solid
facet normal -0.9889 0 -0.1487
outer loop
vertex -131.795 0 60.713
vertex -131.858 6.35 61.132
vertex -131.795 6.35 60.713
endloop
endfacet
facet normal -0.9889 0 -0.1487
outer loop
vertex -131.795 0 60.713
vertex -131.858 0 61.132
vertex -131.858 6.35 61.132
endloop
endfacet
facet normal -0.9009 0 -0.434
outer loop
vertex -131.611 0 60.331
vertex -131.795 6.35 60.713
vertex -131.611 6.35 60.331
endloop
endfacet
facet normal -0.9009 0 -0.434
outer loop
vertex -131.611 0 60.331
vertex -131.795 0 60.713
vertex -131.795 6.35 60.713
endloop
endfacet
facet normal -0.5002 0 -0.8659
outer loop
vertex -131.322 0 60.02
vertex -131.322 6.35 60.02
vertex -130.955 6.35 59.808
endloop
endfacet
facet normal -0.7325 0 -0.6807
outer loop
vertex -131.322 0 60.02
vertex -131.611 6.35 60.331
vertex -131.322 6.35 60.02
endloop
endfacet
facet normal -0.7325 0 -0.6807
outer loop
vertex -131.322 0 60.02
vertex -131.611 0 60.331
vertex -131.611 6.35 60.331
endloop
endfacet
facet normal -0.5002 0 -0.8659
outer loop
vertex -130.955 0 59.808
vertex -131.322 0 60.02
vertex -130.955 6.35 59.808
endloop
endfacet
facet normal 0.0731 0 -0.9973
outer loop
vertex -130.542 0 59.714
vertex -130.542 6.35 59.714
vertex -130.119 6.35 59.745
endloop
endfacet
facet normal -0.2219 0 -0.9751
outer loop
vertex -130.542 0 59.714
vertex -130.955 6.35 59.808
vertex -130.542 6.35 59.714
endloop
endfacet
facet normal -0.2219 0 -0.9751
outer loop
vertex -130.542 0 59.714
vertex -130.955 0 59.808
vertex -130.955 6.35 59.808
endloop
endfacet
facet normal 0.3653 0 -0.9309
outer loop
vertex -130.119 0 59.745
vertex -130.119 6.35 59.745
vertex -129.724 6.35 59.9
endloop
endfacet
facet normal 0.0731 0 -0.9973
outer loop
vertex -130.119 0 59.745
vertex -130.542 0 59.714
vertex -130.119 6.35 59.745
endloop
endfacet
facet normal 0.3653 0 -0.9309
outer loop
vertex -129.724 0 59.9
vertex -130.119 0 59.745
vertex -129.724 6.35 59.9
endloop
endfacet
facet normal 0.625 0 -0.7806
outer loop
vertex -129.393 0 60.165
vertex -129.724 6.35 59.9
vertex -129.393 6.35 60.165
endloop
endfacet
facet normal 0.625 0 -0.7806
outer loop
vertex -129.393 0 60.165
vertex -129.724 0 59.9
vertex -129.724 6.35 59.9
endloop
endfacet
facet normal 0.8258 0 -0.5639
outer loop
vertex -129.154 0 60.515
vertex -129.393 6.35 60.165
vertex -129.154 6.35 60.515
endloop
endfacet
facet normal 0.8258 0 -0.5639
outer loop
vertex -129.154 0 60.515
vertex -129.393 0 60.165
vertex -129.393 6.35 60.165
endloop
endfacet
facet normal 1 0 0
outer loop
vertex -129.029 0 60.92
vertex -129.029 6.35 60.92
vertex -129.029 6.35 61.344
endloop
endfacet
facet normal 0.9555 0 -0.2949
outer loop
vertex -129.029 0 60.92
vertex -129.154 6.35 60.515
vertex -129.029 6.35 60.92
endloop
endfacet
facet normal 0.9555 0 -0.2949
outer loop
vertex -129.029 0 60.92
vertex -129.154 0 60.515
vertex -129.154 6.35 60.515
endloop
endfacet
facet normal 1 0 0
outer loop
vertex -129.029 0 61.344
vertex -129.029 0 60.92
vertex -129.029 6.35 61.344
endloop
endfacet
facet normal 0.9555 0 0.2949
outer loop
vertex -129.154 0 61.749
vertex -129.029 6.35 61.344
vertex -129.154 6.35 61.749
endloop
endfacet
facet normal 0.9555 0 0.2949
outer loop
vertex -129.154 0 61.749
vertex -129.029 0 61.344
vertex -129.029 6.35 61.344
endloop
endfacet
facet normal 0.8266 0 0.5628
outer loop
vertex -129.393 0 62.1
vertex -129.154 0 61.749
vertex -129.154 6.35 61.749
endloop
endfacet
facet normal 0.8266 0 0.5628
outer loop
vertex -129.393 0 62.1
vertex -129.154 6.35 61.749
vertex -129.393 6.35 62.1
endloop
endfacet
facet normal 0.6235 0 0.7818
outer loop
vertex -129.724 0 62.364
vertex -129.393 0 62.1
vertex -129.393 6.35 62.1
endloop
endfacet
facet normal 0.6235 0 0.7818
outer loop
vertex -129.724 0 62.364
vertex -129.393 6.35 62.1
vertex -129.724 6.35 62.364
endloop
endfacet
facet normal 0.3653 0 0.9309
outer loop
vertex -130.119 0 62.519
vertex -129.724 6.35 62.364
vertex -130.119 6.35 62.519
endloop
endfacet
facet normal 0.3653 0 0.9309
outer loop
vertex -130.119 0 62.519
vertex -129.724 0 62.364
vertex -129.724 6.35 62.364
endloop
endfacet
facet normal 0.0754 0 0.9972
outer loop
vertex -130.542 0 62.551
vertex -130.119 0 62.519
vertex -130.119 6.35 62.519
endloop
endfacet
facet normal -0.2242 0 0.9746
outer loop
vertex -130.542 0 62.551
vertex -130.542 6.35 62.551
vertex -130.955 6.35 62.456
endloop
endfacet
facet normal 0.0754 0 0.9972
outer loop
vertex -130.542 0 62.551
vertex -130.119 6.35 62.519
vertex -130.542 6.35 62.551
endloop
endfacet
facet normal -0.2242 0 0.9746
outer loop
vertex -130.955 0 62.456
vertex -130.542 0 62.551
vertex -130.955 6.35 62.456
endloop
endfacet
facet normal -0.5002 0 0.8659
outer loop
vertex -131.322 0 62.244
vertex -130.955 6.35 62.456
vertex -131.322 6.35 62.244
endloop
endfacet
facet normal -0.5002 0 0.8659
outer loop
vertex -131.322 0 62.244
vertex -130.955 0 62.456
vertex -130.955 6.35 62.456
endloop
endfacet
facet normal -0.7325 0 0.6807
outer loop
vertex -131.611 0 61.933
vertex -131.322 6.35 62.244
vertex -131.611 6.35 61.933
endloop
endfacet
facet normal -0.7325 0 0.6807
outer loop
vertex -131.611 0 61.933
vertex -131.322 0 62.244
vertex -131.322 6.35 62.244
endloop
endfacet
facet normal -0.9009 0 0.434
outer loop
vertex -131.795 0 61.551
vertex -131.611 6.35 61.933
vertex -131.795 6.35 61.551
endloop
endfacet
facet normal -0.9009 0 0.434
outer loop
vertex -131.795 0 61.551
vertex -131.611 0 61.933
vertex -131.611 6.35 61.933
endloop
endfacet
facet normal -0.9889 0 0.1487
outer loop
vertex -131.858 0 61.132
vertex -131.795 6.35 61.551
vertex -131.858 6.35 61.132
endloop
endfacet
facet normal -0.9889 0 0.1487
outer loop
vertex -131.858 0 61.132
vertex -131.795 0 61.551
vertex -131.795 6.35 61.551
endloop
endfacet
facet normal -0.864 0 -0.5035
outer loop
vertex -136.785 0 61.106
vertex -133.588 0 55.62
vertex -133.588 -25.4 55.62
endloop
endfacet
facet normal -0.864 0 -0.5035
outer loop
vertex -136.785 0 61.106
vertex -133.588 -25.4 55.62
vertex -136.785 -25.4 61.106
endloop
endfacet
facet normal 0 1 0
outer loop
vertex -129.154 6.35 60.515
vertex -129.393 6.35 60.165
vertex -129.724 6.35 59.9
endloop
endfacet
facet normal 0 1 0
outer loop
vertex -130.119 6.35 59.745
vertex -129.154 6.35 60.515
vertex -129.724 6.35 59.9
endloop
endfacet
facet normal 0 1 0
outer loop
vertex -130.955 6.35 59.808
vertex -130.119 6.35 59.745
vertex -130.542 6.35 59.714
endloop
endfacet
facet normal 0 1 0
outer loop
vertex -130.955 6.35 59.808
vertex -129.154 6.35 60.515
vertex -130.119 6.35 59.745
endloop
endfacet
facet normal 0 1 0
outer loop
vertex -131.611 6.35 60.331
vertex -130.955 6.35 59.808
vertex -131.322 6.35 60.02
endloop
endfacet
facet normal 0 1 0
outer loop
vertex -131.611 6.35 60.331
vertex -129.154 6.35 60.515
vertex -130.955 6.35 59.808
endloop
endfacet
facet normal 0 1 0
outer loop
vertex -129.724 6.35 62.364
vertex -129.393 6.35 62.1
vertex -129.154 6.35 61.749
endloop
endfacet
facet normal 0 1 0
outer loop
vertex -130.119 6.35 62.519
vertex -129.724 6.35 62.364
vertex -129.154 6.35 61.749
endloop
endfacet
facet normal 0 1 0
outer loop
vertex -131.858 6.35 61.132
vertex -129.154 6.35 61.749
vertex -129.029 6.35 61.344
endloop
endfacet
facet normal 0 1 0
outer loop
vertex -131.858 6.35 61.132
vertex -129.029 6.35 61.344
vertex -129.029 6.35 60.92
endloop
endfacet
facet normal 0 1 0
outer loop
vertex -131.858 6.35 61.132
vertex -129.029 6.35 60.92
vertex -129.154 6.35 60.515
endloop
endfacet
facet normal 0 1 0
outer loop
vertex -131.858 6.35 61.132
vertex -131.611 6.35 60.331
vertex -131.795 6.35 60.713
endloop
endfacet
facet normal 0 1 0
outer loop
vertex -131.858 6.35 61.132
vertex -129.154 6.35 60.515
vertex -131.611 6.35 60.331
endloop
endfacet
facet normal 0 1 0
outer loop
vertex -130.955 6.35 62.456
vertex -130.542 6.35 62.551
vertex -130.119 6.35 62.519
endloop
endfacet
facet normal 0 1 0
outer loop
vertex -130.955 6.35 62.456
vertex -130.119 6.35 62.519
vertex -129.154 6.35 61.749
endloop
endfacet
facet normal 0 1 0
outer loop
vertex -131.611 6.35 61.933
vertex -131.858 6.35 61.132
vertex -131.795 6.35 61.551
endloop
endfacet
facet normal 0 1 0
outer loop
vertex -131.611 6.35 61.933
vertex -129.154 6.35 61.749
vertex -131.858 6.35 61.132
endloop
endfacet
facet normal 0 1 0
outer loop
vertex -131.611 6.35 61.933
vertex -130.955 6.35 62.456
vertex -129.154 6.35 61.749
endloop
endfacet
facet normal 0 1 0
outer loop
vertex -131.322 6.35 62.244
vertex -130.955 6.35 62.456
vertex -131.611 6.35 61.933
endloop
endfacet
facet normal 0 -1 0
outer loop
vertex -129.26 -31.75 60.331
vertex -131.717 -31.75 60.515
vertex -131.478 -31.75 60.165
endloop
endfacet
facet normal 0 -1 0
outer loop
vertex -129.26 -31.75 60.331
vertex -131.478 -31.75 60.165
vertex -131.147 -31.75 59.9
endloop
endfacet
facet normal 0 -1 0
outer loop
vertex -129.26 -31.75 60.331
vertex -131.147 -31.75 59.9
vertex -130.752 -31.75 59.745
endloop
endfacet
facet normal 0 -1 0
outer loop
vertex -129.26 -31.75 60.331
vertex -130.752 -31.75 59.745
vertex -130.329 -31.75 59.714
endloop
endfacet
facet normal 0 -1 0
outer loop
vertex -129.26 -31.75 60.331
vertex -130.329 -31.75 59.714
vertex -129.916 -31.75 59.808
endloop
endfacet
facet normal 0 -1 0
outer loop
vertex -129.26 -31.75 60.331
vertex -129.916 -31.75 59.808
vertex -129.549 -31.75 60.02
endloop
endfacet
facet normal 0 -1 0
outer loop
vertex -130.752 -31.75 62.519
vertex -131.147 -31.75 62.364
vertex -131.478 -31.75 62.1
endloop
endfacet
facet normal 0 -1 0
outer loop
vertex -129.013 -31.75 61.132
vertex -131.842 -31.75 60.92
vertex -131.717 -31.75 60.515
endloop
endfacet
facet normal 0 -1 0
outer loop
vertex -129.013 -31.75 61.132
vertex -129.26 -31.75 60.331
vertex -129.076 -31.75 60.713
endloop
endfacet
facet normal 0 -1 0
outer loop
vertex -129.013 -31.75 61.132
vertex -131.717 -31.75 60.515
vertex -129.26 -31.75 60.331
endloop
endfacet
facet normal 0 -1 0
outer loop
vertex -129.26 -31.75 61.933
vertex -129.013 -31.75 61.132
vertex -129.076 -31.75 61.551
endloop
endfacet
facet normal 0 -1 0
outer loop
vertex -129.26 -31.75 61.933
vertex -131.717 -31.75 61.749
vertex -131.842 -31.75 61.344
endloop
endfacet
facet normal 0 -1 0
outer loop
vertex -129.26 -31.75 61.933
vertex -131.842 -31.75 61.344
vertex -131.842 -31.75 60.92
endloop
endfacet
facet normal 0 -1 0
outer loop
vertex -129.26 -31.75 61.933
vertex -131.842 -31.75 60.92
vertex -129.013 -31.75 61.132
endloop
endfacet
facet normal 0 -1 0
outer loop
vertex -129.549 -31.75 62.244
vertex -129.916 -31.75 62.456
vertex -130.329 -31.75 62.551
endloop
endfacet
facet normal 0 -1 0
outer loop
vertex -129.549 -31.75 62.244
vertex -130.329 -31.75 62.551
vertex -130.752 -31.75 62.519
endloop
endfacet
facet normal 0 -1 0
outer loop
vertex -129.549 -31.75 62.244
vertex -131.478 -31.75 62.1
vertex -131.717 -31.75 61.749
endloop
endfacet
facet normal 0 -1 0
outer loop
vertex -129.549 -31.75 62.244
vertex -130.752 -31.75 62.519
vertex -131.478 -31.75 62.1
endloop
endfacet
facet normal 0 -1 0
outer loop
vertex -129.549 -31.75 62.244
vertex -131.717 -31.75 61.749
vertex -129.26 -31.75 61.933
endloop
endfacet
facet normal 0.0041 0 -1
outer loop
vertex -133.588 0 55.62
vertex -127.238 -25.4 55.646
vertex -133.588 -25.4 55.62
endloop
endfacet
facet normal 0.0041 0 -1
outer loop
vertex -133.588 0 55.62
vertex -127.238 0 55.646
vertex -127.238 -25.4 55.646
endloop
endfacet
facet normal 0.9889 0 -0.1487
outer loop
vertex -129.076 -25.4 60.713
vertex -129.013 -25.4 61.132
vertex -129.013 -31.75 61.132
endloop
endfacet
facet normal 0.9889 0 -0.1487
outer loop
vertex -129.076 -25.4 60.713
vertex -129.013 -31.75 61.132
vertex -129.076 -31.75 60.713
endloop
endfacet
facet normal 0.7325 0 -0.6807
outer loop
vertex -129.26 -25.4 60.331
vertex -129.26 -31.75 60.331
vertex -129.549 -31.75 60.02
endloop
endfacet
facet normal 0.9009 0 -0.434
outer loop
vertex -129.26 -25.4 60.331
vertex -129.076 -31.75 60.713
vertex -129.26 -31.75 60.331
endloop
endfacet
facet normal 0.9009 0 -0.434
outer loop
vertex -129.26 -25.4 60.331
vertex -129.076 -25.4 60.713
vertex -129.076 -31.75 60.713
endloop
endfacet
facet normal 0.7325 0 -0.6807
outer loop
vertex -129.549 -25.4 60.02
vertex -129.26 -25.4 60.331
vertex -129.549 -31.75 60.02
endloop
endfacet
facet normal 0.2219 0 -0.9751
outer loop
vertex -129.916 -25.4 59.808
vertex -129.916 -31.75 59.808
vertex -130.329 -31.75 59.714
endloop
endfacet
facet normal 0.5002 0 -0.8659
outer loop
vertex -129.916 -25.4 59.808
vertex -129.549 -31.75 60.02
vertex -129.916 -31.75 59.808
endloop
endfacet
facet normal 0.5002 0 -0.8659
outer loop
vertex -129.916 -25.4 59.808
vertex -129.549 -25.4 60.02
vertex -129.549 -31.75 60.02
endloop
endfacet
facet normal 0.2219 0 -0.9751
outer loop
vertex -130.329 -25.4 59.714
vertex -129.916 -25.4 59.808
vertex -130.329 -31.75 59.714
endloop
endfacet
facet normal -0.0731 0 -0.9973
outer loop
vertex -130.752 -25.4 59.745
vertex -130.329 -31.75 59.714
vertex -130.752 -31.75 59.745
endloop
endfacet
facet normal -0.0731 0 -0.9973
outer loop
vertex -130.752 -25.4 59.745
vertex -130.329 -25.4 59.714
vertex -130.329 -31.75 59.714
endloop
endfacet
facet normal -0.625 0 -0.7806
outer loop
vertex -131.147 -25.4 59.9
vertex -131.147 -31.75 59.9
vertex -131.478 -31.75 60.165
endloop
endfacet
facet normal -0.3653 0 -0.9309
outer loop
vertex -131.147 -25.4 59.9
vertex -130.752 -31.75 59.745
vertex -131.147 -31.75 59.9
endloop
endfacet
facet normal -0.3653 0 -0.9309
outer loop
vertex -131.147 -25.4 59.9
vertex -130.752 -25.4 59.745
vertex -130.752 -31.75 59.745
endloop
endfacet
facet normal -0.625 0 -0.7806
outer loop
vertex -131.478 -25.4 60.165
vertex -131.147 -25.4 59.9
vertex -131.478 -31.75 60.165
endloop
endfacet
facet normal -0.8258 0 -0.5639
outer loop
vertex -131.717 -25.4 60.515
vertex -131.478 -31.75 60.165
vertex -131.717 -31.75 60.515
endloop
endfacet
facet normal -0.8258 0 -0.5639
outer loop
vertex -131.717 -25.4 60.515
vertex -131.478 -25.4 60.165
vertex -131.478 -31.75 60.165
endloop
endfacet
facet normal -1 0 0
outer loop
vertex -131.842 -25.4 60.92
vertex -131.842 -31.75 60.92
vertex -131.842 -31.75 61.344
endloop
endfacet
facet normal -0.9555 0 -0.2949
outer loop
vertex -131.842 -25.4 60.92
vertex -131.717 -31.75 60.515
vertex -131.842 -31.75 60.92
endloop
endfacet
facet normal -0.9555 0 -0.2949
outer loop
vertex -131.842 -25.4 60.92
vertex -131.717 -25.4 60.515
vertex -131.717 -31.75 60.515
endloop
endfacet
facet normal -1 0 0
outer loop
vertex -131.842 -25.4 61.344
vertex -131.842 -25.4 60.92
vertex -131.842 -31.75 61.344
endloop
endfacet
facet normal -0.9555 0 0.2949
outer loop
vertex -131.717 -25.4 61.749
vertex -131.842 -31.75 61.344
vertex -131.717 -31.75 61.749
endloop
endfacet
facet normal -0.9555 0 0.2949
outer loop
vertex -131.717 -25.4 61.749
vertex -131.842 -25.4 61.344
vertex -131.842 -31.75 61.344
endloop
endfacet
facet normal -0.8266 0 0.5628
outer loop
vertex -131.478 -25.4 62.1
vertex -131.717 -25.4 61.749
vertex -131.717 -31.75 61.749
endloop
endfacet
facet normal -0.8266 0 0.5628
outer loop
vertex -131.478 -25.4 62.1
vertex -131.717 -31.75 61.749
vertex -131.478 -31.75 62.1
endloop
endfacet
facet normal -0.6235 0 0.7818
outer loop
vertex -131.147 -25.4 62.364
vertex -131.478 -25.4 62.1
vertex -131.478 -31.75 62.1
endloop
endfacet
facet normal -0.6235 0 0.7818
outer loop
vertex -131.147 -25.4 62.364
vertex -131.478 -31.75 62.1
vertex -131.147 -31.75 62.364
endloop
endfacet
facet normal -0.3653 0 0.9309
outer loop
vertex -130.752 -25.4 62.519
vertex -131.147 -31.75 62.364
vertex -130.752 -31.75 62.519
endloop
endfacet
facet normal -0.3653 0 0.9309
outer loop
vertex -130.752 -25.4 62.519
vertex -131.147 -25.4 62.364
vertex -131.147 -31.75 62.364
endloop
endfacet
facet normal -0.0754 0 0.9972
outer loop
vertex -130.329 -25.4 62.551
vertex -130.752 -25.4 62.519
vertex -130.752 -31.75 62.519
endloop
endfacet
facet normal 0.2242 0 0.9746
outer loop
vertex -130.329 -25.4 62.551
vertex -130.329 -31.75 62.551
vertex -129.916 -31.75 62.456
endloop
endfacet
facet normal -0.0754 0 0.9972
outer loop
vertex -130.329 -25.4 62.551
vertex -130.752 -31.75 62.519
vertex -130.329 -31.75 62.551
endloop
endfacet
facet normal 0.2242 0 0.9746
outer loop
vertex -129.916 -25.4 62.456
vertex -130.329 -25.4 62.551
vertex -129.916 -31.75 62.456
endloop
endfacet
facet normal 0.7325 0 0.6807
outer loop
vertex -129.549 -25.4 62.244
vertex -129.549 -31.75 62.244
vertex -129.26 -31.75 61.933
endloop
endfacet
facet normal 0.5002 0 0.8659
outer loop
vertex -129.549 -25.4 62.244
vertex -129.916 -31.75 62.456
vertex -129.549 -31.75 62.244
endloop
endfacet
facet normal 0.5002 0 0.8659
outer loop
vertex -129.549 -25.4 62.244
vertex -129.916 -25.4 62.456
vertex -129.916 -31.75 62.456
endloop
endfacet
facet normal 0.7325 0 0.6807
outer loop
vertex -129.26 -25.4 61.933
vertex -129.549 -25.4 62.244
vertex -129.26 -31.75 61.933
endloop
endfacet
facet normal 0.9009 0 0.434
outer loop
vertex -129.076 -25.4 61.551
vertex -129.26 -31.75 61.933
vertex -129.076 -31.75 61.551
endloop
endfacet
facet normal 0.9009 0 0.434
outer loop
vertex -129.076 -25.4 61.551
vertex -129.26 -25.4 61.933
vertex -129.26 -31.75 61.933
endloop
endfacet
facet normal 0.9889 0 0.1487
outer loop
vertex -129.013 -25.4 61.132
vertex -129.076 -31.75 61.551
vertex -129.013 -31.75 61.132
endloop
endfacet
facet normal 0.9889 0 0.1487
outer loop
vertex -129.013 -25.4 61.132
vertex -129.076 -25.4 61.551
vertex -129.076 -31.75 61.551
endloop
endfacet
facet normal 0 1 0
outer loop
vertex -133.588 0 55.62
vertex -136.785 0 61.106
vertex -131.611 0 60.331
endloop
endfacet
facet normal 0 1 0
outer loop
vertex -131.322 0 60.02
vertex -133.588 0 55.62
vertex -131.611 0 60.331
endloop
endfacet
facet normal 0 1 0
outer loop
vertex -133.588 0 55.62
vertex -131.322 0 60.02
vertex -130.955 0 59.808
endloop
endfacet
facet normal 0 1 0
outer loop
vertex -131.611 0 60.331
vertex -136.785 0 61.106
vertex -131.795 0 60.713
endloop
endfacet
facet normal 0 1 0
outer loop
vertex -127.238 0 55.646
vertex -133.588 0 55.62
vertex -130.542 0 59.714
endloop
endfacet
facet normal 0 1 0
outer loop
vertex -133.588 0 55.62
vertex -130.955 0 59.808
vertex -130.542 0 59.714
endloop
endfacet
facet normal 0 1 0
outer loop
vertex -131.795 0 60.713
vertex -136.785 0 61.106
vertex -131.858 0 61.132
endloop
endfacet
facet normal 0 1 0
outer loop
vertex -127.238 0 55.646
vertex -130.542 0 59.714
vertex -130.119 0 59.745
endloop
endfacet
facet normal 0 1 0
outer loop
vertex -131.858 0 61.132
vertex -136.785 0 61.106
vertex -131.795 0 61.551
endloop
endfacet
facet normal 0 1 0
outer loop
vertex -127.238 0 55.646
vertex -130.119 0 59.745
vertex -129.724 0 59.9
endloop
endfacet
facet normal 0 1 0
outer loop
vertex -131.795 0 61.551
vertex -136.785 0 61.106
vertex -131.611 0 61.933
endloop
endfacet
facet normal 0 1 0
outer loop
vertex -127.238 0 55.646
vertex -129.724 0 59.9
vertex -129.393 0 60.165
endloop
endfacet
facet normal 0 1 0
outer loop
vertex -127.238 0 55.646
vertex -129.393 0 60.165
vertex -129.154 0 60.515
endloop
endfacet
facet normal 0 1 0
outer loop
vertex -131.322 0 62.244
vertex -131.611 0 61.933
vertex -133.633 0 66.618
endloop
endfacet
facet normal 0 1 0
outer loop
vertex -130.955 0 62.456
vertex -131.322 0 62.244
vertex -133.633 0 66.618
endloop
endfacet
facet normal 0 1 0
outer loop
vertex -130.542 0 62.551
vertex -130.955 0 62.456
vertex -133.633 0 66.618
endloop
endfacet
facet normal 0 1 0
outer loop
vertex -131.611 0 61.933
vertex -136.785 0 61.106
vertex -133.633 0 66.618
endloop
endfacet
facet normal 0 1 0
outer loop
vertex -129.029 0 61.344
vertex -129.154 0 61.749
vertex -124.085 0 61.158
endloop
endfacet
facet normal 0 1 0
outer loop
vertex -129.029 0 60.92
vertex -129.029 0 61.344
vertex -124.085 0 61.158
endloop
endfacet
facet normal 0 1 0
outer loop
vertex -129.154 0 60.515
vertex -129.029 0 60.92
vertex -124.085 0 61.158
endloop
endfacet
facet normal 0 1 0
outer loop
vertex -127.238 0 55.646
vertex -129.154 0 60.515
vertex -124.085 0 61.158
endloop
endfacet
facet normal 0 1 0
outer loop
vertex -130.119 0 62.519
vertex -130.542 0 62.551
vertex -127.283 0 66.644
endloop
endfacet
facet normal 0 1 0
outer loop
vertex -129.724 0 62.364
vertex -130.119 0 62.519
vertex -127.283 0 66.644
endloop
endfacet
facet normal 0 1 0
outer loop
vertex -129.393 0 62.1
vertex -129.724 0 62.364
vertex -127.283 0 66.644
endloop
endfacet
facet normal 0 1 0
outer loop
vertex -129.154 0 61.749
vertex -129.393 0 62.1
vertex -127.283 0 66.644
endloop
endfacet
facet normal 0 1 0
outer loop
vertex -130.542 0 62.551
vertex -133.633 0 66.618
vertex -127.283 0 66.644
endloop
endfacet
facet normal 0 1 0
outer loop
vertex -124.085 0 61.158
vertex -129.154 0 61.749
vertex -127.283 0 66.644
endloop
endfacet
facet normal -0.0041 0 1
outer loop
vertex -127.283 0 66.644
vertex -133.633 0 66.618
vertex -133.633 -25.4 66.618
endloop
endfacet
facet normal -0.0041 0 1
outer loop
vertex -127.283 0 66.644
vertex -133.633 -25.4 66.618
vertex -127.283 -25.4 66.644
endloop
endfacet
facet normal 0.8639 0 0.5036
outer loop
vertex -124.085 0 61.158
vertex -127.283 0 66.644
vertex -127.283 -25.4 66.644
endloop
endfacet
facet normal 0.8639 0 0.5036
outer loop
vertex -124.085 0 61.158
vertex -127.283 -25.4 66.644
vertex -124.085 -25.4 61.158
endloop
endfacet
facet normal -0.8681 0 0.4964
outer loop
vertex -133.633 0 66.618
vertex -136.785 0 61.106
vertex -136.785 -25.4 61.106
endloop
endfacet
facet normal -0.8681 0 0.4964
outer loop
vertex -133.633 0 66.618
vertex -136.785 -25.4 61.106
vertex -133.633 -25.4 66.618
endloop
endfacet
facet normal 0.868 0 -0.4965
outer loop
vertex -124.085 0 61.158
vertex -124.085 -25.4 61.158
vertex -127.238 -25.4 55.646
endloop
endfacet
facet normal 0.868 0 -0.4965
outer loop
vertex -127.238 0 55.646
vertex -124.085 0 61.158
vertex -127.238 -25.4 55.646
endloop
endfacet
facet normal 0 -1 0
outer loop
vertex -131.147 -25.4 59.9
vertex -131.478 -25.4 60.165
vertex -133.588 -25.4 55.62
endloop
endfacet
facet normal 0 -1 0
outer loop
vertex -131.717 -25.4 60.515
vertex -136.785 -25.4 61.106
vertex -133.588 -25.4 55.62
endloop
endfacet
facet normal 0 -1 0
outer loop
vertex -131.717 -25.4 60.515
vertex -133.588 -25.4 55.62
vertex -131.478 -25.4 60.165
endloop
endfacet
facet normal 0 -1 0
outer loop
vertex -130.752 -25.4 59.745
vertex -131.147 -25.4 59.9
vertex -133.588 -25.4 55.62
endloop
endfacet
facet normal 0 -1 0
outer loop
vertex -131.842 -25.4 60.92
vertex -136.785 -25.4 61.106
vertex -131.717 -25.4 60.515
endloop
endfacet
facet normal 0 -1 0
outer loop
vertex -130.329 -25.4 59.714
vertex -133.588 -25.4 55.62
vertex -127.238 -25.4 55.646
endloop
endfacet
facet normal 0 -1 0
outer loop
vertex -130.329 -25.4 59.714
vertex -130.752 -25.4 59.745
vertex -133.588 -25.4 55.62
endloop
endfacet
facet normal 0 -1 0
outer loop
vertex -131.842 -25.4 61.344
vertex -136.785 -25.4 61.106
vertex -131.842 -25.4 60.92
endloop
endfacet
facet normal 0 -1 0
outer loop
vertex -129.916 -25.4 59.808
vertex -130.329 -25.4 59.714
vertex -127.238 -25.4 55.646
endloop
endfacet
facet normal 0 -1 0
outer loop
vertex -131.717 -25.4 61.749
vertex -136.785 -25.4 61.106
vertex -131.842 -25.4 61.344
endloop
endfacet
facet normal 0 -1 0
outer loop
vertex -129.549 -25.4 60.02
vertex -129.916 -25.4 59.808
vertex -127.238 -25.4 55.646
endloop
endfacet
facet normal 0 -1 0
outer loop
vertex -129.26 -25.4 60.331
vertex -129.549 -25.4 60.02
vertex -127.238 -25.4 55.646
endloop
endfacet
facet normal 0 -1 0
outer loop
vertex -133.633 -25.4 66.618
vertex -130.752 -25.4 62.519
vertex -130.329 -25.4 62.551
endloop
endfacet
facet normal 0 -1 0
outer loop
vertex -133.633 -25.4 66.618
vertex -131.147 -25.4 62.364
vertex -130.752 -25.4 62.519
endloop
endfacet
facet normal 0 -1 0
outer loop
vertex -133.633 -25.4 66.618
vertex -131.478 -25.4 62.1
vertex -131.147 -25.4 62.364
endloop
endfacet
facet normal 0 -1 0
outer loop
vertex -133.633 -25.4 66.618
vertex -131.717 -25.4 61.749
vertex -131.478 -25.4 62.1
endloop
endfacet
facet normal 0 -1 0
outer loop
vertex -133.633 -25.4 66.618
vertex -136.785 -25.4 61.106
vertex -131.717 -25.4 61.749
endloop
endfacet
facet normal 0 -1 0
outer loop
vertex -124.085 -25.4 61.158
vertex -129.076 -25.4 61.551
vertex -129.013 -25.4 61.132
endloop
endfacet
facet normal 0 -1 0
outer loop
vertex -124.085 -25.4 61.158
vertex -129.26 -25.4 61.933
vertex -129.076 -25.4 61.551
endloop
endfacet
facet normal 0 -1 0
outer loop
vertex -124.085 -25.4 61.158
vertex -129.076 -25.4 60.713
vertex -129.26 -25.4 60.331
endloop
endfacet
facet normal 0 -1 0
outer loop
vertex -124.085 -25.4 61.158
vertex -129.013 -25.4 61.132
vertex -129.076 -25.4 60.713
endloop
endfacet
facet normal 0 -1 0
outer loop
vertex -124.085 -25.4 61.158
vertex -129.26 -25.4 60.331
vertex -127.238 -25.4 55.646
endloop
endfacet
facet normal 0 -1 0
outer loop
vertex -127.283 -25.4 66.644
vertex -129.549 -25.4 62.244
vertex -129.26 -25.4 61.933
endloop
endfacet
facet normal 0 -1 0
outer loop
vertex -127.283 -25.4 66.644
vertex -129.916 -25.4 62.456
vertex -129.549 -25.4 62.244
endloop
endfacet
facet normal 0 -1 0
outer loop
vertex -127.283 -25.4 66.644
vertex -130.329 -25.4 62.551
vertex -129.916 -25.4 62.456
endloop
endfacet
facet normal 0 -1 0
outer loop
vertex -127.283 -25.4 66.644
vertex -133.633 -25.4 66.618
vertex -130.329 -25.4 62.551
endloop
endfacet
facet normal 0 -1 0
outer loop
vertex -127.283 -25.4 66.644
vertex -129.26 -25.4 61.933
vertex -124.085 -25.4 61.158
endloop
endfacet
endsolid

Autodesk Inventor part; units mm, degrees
ref_plane "YZ Plane" through (0, 0, 0) normal (1, 0, 0) x (0, 1, 0)
ref_plane "XZ Plane" through (0, 0, 0) normal (0, 1, 0) x (-1, 0, 0)
ref_plane "XY Plane" through (0, 0, 0) normal (0, 0, 1) x (1, 0, 0)
sketch "Sketch1" plane through (0, 0, 0) normal (0, 1, 0) x (-1, 0, 0)
  circle A0 centre (130.4354, 61.1321) radius 1.4224
  point P0 (0, 0)
  dimension "d0" = 2.8448
extrude "Extrusion1" add sketch "Sketch1" along normal blind 6.35
sketch "Sketch2" plane through (-130.4354, 0, 61.1321) normal (0, -1, 0) x (1, 0, 0)
  circle A0 centre (0, 0) radius 1.4224 construction
  line L0 (3.1527, 5.5122) -> (6.35, 0.0258)
  line L1 (6.35, 0.0258) -> (3.1973, -5.4864)
  line L2 (3.1973, -5.4864) -> (-3.1527, -5.5122)
  line L3 (-3.1527, -5.5122) -> (-6.35, -0.0258)
  line L4 (-6.35, -0.0258) -> (-3.1973, 5.4864)
  line L5 (-3.1973, 5.4864) -> (3.1527, 5.5122)
  point P0 (130.4354, -61.1321)
  dimension "d3" = 6.35
extrude "Extrusion2" add sketch "Sketch2" along normal blind 25.4
sketch "Sketch3" plane through (-130.4354, -25.4, 61.1321) normal (0, -1, 0) x (1, 0, 0)
  circle A0 centre (0, 0) radius 1.4224 projected
  point P0 (130.4354, -61.1321)
extrude "Extrusion3" add sketch "Sketch3" along normal blind 6.35
